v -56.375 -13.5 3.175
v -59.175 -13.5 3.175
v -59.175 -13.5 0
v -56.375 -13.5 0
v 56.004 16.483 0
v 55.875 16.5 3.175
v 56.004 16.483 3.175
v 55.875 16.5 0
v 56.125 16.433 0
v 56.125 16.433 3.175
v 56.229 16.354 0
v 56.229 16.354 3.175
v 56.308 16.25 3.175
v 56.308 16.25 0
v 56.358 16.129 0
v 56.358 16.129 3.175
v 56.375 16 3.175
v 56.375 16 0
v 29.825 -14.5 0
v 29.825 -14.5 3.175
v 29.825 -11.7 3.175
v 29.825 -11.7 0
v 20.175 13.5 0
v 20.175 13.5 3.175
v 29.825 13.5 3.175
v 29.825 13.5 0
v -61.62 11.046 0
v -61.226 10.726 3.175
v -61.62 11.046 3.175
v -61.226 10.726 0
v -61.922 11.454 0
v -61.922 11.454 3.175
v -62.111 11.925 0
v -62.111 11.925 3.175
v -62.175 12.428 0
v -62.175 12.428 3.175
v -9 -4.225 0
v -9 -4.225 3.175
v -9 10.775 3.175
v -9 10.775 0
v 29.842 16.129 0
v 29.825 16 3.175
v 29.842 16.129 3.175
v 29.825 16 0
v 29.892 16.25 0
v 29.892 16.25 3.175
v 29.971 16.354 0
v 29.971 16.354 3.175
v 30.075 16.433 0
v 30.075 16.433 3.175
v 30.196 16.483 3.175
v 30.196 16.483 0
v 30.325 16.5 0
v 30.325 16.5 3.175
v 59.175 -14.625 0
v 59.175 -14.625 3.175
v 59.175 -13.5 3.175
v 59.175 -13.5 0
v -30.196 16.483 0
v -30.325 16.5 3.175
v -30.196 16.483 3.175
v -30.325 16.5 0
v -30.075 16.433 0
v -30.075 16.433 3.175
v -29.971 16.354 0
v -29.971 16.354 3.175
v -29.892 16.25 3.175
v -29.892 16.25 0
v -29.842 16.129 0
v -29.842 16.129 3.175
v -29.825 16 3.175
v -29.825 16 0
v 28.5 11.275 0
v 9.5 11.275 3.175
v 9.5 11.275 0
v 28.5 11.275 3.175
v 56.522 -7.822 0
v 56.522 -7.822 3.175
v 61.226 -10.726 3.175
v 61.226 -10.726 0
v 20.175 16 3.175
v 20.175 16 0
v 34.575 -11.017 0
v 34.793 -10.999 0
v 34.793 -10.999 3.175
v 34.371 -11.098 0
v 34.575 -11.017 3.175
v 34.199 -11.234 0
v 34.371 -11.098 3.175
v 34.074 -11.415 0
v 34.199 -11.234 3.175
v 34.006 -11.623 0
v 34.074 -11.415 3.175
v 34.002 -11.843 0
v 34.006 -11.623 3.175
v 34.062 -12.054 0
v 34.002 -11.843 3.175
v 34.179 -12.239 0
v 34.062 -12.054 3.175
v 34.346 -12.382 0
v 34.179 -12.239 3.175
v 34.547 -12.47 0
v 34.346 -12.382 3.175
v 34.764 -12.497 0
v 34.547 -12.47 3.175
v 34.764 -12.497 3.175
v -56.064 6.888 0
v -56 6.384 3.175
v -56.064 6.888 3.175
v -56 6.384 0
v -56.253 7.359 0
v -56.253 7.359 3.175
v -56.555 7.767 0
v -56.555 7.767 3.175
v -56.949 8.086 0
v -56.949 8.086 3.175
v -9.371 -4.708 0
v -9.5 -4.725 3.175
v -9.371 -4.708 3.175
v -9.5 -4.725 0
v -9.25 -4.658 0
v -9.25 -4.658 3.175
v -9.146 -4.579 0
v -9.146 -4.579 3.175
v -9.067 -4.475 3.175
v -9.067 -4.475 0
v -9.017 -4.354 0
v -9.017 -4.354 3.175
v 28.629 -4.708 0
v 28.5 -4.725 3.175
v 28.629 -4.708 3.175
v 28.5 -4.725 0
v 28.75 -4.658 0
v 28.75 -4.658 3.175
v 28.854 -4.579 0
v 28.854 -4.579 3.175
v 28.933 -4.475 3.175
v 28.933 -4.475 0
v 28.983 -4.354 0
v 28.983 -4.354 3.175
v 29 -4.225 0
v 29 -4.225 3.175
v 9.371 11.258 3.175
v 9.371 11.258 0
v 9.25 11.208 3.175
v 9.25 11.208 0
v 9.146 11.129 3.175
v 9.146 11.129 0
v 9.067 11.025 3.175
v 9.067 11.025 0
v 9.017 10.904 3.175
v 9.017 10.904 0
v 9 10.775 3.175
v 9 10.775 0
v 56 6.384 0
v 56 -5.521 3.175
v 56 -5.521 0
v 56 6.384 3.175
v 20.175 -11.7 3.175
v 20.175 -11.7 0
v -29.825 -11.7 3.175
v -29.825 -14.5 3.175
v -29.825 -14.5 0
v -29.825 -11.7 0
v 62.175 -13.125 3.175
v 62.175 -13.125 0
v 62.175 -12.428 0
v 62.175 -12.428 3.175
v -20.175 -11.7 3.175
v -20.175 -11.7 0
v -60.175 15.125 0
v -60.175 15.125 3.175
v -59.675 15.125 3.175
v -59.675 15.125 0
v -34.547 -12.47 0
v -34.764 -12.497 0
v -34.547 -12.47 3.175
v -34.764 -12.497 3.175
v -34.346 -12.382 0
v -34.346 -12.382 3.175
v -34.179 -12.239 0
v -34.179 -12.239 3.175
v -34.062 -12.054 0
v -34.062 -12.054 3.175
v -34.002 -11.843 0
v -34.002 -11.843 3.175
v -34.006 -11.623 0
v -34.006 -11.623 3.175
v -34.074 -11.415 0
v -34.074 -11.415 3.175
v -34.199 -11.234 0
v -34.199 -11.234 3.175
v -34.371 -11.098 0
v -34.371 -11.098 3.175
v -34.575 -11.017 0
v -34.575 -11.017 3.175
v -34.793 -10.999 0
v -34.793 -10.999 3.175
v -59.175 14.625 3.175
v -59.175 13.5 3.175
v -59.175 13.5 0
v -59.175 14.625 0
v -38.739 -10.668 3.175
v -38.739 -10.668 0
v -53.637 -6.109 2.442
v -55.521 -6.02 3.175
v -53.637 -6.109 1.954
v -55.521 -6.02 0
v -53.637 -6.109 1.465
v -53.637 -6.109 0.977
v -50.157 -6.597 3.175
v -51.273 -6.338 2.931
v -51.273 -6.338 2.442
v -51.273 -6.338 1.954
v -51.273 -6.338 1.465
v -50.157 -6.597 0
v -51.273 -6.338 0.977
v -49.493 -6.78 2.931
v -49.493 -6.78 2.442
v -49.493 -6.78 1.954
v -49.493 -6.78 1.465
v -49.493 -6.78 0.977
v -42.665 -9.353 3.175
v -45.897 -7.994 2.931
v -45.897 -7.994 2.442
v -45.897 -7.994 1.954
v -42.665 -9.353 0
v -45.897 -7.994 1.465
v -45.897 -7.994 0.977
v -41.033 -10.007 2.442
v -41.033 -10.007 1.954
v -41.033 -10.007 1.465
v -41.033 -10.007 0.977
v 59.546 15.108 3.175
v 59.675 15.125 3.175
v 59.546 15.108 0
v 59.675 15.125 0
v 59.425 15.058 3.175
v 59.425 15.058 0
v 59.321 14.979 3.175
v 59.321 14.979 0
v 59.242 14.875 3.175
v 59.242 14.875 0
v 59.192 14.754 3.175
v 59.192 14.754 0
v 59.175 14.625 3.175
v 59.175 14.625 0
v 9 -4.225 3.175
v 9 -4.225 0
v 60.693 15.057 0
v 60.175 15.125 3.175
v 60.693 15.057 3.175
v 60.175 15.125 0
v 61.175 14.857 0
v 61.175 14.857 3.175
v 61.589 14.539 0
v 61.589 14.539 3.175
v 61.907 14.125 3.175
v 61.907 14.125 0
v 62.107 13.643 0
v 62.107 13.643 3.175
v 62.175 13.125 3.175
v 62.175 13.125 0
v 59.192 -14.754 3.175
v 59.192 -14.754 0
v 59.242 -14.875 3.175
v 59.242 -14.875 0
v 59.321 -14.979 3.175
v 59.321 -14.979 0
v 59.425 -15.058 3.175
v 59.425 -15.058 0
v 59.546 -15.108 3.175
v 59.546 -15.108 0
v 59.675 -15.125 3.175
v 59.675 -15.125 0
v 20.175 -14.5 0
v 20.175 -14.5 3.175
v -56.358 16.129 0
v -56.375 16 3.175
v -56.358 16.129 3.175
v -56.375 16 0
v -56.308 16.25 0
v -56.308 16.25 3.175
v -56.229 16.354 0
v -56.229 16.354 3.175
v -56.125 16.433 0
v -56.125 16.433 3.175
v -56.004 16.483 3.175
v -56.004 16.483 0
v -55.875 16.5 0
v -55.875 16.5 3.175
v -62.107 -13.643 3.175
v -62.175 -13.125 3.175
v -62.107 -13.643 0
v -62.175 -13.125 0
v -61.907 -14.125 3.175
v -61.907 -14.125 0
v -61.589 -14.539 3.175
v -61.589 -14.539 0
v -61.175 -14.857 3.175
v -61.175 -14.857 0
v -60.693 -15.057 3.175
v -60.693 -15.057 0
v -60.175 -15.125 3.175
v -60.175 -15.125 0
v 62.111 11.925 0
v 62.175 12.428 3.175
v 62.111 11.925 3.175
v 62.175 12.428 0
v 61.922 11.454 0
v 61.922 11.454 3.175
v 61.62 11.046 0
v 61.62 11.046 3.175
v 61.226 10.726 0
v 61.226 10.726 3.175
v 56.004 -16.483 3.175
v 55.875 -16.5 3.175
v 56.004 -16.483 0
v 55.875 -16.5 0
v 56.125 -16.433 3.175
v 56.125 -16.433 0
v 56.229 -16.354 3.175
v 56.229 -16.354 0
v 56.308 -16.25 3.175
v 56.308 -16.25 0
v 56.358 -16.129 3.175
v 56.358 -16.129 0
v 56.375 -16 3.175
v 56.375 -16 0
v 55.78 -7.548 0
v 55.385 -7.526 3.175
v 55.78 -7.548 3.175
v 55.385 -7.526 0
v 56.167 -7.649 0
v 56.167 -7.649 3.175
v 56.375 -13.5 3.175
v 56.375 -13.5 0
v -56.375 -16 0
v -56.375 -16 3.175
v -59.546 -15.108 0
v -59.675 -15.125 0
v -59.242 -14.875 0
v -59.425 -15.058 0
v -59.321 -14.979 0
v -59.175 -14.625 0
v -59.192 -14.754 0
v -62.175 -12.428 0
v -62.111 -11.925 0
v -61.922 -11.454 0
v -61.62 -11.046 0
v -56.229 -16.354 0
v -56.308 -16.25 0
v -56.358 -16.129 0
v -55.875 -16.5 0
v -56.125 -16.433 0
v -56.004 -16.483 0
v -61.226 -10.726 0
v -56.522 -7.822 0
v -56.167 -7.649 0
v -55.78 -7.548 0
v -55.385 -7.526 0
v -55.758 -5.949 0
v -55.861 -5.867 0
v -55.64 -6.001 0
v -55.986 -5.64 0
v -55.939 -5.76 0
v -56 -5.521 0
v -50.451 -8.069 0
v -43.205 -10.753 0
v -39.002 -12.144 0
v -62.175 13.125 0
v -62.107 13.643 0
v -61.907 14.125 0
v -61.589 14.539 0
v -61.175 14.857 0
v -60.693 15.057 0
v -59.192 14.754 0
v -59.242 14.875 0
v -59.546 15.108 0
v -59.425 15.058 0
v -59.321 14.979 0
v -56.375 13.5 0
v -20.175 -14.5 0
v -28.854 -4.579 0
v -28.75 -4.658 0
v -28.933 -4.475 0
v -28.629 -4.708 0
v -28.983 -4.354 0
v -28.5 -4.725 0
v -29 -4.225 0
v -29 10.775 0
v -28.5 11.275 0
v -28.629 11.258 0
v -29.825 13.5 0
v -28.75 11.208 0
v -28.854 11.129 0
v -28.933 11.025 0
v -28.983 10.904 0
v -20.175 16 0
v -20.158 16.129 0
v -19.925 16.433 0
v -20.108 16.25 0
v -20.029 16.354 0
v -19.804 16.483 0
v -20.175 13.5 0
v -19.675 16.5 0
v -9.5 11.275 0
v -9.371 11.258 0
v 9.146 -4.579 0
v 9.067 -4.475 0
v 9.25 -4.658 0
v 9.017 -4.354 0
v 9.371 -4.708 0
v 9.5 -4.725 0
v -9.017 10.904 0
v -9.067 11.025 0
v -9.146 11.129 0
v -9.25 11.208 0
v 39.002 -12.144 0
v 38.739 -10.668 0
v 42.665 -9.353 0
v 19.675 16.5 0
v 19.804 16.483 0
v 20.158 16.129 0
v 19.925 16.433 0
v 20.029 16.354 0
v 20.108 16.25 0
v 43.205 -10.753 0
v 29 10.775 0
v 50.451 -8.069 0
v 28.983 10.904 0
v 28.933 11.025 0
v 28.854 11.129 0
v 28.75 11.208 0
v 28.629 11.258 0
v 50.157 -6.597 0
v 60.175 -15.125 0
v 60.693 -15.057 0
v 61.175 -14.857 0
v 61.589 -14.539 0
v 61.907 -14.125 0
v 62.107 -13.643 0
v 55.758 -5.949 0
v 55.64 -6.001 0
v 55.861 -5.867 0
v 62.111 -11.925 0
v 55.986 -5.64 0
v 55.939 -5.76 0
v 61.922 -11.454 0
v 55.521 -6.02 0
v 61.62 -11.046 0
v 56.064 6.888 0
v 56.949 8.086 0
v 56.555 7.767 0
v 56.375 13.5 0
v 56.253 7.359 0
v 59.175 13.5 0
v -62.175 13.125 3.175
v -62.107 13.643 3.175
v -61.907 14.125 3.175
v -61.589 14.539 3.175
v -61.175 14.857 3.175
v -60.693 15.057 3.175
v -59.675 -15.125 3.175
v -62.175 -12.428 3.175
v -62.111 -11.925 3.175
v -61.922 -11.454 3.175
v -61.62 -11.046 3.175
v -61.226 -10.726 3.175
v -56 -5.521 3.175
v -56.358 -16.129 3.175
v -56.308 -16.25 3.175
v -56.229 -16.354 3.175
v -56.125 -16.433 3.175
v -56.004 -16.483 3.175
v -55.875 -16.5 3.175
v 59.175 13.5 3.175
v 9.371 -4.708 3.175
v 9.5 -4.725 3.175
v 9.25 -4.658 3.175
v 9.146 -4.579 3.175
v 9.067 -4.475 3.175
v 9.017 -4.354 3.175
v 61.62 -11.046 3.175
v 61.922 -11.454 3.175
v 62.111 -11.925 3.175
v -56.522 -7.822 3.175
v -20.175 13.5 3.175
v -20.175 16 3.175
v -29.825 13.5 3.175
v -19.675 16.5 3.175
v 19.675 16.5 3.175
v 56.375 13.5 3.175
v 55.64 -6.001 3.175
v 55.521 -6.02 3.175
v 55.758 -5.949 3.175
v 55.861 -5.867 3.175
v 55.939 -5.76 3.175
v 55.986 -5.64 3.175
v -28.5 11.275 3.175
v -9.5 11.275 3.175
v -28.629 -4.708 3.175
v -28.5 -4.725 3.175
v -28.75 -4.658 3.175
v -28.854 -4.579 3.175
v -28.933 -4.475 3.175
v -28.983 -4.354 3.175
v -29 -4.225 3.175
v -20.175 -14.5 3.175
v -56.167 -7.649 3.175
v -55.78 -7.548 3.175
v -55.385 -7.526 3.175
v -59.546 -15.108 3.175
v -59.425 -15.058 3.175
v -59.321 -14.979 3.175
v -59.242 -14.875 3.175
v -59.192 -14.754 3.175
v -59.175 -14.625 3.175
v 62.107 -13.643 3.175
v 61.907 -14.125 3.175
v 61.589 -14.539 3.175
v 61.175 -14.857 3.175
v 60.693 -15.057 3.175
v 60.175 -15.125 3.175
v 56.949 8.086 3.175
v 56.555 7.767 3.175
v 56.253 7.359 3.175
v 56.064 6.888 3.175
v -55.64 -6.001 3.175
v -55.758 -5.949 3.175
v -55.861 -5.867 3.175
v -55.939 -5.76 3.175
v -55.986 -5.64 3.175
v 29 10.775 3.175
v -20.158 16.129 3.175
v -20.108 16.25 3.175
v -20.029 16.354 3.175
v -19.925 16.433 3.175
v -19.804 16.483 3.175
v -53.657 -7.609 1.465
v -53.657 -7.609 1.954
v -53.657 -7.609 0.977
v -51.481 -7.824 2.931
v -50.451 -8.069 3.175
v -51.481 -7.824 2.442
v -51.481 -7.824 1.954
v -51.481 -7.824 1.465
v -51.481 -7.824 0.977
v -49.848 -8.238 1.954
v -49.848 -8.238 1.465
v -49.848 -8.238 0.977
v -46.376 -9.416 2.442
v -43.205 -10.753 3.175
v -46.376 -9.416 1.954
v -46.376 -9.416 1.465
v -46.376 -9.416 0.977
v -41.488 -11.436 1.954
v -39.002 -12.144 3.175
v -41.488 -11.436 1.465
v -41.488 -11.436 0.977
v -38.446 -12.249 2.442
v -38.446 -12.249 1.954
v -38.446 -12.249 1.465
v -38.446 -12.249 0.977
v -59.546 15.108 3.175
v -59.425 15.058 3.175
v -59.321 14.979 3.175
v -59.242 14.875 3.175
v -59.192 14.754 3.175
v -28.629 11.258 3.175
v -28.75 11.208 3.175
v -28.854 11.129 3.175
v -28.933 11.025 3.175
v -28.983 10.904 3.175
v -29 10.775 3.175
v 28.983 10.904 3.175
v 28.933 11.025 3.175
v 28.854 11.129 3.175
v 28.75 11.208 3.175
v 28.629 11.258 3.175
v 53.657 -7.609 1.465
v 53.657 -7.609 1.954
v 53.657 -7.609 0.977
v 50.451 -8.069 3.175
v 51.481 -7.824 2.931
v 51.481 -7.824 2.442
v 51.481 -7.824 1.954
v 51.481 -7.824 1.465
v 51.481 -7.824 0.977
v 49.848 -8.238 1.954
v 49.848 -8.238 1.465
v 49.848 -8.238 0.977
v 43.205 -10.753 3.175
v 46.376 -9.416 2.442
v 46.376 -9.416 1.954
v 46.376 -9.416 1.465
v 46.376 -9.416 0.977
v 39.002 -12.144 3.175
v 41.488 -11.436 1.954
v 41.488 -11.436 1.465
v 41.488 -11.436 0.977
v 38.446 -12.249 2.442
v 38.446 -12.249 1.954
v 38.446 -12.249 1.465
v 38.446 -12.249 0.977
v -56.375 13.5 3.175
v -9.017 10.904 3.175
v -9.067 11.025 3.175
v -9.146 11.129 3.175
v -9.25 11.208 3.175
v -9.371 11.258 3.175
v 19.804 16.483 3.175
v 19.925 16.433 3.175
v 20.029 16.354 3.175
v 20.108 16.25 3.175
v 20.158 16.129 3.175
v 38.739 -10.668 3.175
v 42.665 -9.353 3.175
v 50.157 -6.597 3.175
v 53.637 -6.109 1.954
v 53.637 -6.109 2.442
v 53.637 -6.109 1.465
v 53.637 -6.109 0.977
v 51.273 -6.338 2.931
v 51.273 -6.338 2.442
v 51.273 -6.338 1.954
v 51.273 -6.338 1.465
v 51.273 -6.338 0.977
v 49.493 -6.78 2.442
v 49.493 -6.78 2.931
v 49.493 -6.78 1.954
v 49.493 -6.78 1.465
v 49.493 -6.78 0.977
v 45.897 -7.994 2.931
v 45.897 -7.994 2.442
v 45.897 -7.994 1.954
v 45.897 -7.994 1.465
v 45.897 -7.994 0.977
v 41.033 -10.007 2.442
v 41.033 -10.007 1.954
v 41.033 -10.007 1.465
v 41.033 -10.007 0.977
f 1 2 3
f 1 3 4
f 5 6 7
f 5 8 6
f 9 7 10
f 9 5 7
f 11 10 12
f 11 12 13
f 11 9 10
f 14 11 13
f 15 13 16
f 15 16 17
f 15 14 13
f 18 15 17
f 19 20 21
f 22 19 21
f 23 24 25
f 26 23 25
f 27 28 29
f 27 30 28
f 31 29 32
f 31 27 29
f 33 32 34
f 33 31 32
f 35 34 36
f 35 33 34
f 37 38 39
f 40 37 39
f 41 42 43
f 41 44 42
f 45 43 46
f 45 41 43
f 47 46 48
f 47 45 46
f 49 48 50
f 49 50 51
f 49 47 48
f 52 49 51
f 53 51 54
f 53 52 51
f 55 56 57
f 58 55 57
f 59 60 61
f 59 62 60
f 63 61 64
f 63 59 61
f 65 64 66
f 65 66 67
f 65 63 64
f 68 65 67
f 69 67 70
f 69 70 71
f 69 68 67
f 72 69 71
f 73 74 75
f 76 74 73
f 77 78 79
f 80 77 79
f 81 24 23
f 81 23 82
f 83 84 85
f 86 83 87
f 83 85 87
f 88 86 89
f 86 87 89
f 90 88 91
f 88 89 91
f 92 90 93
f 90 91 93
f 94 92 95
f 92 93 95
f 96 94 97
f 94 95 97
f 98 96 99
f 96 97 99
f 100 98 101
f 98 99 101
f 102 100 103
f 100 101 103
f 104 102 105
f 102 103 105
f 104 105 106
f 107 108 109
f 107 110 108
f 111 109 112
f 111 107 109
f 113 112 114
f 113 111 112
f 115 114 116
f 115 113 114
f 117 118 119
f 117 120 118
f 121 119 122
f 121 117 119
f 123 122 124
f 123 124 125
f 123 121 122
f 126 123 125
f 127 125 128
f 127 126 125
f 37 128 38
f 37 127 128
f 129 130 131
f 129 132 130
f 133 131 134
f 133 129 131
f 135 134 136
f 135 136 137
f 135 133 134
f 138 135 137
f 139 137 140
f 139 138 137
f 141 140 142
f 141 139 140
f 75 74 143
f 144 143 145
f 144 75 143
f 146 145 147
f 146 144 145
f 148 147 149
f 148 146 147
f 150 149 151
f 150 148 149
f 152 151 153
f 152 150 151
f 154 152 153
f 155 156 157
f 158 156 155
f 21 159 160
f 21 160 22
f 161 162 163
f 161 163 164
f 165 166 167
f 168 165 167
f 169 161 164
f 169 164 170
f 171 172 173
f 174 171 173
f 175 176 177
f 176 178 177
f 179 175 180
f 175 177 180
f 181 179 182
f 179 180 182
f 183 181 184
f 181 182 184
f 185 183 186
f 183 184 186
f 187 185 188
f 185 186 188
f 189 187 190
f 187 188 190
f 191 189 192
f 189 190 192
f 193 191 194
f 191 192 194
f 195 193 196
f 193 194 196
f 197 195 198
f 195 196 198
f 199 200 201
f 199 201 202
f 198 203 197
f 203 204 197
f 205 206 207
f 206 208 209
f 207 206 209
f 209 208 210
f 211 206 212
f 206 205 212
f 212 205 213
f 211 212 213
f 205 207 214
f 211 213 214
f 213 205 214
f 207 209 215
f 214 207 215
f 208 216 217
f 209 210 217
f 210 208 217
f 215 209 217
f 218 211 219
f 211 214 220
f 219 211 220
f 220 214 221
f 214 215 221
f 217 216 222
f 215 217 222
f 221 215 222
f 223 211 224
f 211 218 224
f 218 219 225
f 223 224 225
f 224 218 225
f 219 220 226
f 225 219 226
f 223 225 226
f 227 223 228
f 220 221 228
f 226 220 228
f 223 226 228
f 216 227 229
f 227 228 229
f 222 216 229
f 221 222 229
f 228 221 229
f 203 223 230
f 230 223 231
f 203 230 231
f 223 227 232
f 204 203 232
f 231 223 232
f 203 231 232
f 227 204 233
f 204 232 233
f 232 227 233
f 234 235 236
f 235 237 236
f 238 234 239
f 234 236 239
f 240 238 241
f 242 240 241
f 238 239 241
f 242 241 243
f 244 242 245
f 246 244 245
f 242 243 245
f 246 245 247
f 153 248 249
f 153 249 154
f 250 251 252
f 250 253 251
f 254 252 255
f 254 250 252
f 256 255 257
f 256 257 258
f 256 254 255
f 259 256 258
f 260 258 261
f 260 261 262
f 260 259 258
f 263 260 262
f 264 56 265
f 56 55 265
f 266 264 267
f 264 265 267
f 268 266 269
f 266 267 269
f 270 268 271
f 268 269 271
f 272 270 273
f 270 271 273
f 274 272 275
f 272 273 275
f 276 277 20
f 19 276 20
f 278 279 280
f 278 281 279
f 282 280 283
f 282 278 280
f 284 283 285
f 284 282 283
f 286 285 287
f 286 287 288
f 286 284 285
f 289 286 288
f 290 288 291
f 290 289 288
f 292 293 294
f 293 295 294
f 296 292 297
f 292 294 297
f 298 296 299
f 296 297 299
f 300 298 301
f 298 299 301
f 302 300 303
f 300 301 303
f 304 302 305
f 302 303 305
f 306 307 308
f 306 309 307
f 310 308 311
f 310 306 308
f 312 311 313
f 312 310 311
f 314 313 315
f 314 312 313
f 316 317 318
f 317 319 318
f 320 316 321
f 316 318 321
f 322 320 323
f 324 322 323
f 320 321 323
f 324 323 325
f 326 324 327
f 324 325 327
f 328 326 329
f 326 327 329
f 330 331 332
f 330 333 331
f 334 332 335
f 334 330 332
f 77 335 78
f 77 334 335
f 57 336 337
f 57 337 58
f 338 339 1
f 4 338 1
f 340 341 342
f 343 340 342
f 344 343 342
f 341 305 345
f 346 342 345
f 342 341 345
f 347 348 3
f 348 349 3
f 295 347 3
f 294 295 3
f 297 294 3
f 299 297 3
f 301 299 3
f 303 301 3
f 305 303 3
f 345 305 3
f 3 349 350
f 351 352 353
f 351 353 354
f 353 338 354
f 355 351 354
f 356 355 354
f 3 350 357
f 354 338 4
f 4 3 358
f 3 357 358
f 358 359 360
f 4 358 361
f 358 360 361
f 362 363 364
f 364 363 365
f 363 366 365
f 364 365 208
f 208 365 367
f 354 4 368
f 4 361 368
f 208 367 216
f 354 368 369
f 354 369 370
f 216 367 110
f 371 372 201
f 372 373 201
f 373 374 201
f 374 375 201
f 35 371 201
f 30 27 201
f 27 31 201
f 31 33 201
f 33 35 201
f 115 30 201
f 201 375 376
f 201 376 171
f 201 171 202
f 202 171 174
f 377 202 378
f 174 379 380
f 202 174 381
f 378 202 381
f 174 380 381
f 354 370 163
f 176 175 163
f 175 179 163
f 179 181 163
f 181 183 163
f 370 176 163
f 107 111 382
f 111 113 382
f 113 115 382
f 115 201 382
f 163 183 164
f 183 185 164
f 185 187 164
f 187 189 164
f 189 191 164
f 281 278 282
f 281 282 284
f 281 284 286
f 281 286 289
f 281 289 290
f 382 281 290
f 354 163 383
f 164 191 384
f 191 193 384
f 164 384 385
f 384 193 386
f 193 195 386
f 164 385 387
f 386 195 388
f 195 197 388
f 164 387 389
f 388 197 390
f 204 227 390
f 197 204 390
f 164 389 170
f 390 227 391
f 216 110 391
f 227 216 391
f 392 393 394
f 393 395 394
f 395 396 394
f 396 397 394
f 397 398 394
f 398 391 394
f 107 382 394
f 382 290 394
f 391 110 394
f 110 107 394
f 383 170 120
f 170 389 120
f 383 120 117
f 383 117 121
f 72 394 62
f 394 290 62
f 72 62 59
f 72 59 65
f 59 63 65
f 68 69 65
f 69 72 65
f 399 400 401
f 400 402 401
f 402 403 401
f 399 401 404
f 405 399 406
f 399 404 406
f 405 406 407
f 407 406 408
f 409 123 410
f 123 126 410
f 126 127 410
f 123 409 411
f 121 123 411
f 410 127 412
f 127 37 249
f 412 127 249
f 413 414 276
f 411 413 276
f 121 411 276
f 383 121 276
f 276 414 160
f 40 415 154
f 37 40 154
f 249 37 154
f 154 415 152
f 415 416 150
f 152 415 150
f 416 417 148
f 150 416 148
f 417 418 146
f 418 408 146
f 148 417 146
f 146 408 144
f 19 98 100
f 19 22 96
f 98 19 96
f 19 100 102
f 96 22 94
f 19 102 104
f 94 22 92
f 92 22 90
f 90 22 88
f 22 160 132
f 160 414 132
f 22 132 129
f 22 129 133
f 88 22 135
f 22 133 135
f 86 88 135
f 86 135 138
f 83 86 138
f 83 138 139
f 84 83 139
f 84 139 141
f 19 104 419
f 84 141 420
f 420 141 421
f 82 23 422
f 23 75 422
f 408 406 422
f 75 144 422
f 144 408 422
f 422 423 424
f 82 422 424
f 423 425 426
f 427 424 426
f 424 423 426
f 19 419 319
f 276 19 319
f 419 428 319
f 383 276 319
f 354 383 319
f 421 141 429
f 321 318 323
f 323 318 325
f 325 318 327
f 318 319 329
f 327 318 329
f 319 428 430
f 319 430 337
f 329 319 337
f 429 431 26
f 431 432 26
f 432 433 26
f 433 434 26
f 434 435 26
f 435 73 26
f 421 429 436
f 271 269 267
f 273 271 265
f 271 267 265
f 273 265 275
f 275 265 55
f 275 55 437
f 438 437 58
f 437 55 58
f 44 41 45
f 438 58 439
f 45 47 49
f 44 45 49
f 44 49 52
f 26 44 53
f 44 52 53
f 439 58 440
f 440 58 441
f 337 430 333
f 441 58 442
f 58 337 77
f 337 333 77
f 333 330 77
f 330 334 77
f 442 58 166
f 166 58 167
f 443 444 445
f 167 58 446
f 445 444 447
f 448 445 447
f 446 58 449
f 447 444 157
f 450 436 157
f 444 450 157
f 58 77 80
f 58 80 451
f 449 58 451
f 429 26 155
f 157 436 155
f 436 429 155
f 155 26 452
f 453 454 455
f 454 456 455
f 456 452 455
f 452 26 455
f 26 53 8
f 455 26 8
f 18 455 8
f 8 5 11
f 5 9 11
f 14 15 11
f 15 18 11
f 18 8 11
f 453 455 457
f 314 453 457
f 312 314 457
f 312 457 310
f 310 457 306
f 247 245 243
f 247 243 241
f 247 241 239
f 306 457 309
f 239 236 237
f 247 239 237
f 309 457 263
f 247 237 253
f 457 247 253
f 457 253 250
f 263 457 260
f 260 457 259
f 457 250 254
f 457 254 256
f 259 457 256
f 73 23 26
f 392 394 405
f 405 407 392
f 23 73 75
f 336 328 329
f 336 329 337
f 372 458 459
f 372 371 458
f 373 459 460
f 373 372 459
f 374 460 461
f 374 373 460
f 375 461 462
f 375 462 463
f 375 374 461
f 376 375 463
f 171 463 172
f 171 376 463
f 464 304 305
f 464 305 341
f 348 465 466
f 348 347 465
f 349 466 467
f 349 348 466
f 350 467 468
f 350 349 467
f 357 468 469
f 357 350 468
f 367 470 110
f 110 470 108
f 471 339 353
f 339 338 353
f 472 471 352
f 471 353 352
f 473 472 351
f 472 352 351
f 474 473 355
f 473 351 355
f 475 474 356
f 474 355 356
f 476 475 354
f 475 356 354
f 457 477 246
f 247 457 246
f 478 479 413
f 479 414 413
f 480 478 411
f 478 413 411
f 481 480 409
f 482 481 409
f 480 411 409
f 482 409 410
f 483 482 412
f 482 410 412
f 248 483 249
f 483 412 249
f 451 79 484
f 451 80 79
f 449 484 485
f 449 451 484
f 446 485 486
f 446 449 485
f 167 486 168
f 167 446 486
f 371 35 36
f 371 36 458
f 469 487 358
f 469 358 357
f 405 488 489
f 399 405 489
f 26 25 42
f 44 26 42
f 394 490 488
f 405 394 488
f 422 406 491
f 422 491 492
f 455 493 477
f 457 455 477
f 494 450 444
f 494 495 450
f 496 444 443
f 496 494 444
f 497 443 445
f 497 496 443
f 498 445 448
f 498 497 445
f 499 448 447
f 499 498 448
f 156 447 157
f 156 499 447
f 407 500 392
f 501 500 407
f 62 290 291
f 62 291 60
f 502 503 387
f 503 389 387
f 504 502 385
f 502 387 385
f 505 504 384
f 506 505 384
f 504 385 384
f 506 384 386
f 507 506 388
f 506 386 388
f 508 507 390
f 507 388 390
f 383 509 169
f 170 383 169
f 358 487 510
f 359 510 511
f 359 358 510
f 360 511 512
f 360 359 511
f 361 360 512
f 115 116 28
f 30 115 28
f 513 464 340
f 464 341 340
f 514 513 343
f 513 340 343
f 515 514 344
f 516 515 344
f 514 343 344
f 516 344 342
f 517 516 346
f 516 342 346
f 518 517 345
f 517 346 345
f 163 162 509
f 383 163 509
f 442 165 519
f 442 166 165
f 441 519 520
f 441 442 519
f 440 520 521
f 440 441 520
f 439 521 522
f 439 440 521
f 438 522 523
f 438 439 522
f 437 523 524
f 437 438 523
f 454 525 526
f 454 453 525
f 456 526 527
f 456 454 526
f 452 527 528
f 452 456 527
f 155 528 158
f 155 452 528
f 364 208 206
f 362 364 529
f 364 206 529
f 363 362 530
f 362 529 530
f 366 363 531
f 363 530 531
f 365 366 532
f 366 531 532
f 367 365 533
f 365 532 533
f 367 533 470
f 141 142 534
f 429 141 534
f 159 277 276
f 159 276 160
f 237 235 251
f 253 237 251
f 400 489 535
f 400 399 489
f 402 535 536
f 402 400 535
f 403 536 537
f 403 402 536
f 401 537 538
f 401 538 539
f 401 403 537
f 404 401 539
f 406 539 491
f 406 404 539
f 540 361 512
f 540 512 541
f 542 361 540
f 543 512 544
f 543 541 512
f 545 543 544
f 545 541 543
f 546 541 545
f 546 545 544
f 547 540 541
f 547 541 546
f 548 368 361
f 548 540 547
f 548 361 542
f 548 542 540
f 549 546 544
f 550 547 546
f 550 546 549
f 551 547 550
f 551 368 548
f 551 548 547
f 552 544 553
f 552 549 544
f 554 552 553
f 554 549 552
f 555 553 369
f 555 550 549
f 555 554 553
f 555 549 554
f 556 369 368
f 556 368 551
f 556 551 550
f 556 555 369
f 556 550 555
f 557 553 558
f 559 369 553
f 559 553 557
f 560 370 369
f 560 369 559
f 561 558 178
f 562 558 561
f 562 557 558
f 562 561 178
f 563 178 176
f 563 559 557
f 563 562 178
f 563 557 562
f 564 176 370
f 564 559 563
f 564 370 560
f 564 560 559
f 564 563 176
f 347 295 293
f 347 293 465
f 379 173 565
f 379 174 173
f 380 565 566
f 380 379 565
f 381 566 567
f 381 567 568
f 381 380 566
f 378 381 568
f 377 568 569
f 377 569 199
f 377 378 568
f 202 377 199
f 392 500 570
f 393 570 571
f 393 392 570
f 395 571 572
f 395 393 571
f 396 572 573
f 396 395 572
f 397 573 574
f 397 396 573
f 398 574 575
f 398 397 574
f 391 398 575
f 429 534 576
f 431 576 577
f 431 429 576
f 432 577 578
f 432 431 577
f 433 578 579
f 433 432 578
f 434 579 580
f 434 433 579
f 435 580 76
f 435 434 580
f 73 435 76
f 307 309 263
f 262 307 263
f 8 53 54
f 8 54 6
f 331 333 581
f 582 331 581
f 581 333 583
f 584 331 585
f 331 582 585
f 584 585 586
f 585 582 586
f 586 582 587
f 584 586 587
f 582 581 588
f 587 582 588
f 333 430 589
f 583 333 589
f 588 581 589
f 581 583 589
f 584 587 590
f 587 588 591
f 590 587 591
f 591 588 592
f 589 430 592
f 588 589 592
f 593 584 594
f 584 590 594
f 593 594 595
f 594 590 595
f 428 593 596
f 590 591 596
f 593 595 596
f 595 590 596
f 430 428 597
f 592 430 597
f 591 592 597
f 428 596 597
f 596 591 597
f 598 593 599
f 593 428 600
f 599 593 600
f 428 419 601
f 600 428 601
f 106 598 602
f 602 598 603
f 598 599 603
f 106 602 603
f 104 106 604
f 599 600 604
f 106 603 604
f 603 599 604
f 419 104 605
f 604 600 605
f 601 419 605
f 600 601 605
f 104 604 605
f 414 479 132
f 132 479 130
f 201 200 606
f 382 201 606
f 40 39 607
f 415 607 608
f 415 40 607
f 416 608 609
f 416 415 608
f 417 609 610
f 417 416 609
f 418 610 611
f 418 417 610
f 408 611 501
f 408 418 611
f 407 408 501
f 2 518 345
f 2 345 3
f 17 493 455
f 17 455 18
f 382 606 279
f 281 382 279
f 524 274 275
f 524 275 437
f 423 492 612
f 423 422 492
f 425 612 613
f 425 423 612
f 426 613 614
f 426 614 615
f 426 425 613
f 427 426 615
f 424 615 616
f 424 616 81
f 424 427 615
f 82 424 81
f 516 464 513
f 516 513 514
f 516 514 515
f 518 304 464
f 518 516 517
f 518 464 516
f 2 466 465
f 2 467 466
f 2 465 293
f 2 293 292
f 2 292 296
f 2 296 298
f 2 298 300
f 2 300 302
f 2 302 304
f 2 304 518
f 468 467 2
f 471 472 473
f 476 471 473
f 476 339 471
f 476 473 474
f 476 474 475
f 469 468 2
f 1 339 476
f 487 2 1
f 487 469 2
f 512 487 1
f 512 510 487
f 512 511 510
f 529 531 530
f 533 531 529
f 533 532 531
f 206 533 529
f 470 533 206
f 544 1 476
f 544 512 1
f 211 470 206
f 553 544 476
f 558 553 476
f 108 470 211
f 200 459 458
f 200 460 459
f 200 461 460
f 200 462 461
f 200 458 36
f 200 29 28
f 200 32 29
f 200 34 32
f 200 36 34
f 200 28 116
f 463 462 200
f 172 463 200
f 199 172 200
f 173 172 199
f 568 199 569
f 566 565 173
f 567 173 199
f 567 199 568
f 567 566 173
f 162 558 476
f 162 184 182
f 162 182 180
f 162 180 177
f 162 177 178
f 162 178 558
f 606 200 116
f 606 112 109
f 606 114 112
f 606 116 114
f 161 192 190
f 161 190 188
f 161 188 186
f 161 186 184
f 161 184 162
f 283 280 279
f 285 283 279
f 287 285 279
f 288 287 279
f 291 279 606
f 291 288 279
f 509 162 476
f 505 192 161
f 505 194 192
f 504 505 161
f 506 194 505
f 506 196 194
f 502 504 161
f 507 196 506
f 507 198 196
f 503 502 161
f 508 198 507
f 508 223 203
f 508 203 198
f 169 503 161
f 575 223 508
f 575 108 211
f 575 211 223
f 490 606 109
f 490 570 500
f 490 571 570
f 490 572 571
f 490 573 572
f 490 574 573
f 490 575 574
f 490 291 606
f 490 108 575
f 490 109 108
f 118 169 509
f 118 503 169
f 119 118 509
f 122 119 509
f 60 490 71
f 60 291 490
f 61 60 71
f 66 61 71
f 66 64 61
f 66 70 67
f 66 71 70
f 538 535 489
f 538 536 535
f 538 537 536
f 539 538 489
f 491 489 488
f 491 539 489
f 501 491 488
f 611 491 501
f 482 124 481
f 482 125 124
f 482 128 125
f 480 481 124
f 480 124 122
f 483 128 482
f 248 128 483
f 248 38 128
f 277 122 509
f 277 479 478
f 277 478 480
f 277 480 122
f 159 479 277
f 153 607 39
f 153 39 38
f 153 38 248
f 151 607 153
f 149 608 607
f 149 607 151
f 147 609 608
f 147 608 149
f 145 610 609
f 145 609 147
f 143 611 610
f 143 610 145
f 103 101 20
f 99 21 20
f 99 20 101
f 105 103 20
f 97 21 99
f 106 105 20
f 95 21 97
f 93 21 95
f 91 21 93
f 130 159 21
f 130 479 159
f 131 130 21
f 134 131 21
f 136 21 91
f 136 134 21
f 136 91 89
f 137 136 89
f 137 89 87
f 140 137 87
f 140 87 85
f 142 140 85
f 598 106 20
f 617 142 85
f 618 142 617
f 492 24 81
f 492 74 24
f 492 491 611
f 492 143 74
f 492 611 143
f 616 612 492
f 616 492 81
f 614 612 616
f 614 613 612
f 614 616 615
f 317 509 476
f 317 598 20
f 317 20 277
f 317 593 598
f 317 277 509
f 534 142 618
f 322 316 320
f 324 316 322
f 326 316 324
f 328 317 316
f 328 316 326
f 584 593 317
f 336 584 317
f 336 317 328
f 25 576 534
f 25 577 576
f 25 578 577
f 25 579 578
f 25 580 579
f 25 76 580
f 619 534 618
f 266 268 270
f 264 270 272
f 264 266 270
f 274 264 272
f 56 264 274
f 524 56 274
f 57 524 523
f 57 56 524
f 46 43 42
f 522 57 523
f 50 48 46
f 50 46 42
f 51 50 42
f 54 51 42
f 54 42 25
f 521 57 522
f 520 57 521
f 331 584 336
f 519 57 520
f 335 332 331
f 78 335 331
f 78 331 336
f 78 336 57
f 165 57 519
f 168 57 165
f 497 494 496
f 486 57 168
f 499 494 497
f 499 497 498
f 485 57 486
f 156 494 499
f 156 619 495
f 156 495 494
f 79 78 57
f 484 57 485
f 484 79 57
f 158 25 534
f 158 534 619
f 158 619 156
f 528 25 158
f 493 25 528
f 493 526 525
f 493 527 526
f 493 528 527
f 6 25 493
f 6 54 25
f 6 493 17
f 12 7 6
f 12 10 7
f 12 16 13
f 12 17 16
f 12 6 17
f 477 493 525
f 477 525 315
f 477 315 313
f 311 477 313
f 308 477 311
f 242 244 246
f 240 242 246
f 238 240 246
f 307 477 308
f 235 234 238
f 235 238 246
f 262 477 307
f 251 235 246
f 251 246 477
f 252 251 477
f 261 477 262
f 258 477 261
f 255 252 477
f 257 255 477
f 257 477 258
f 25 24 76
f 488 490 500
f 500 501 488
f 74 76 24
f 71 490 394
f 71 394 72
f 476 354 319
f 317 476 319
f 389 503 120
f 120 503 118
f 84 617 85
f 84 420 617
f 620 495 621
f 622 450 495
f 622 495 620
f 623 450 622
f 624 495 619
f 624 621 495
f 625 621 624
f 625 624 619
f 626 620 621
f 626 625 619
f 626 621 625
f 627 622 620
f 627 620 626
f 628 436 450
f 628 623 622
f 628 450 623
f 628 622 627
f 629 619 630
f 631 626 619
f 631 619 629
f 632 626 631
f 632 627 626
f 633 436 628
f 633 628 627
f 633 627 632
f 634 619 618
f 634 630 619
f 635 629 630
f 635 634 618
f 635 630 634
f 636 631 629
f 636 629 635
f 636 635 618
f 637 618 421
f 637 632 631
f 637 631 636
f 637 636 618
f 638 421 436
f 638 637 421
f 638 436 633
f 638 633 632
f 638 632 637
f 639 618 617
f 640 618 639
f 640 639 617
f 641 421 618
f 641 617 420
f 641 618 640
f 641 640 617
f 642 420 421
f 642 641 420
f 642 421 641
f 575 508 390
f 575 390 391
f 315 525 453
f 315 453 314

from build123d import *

# Parameters (mm, degrees)
SKETCH1_W           = 124.35
SKETCH1_H           = 33
BOSS_EXTRUDE1_DEPTH = 3.175
SKETCH2_W           = 9.65
SKETCH2_H           = 2.8
SKETCH2_H_2         = 3
CUT_EXTRUDE1_DEPTH  = 65.405444257
SKETCH4_W           = 2.8
SKETCH4_H           = 3
SKETCH4_W_2         = 6.175
SKETCH4_H_2         = 15
CUT_EXTRUDE2_DEPTH  = 65.405444257
SKETCH6_W           = 3
SKETCH6_H           = 1.375
CUT_EXTRUDE3_DEPTH  = 65.405444257
CUT_SWEEP1_DEPTH    = 3.175
SKETCH12_R          = 0.75
CUT_EXTRUDE6_DEPTH  = 65.405444385
CUT_EXTRUDE7_DEPTH  = 65.405444385
FILLET6_R           = 2
FILLET7_R           = 0.5
SKETCH15_W          = 20
SKETCH15_H          = 16
CUT_EXTRUDE9_DEPTH  = 65.405444385
FILLET9_R           = 0.5


# Read off the part's stored shape, not the designer's step: Cut-Sweep1
with BuildPart() as part:
    # Sketch1 → Boss-Extrude1 (new body)
    with BuildSketch(Plane.XY):
        Rectangle(SKETCH1_W, SKETCH1_H)
    extrude(amount=BOSS_EXTRUDE1_DEPTH)

    # Sketch2 → Cut-Extrude1 (cut, through all)
    with BuildSketch(Plane.XY.offset(3.175)):
        with Locations((-25, -13.1)):
            Rectangle(SKETCH2_W, SKETCH2_H)
        with Locations((25, -13.1)):
            Rectangle(SKETCH2_W, SKETCH2_H)
        with Locations((-25, 15)):
            Rectangle(SKETCH2_W, SKETCH2_H_2)
        with Locations((25, 15)):
            Rectangle(SKETCH2_W, SKETCH2_H_2)
    extrude(amount=-CUT_EXTRUDE1_DEPTH, mode=Mode.SUBTRACT)

    # Sketch4 → Cut-Extrude2 (cut, through all)
    with BuildSketch(Plane.XY.offset(3.175)):
        with Locations((-57.775, 15)):
            Rectangle(SKETCH4_W, SKETCH4_H)
        with Locations((-59.0875, 0)):
            Rectangle(SKETCH4_W_2, SKETCH4_H_2)
        with Locations((-57.775, -15)):
            Rectangle(SKETCH4_W, SKETCH4_H)
        with Locations((57.775, 15)):
            Rectangle(SKETCH4_W, SKETCH4_H)
        with Locations((59.0875, 0)):
            Rectangle(SKETCH4_W_2, SKETCH4_H_2)
        with Locations((57.775, -15)):
            Rectangle(SKETCH4_W, SKETCH4_H)
    extrude(amount=-CUT_EXTRUDE2_DEPTH, mode=Mode.SUBTRACT)

    # Sketch6 → Cut-Extrude3 (cut, through all)
    with BuildSketch(Plane.XY.offset(3.175)):
        with Locations((-60.675, 15.8125)):
            Rectangle(SKETCH6_W, SKETCH6_H)
        with Locations((-60.675, -15.8125)):
            Rectangle(SKETCH6_W, SKETCH6_H)
        with Locations((60.675, 15.8125)):
            Rectangle(SKETCH6_W, SKETCH6_H)
        with Locations((60.675, -15.8125)):
            Rectangle(SKETCH6_W, SKETCH6_H)
    extrude(amount=-CUT_EXTRUDE3_DEPTH, mode=Mode.SUBTRACT)

    # Cut-Sweep1 outline → Cut-Sweep1 (cut)
    with BuildSketch(Plane.XY):
        with BuildLine():
            add(Edge.make_bspline(
                [(-56, -6), (-55.016272395, -6.040912607), (-53.484317245, -6.110006936), (-52.10462272, -6.208217255), (-51.370216858, -6.312882143), (-50.849013323, -6.424427059), (-50.274077583, -6.562740427), (-49.507561658, -6.770408498), (-47.98416767, -7.234467607), (-46.535590196, -7.742954919), (-44.899823838, -8.383891144), (-43.265010906, -9.091671777), (-41.074137026, -10.055384808), (-38.357692762, -10.850187014), (-36.1078612, -11.027108547), (-34.793437631, -10.999002823)],
                knots=[0, 0, 0, 0, 0.052266667, 0.104533333, 0.1568, 0.188540911, 0.209066667, 0.261333333, 0.3136, 0.4368, 0.46346514, 0.56, 0.706666667, 0.853333333, 1, 1, 1, 1], degree=3))
            Line((-56, -6), (-56, -7.5))
            add(Edge.make_bspline(
                [(-56, -7.5), (-55.020423649, -7.540842864), (-53.496771007, -7.609797709), (-52.171479553, -7.70829789), (-51.569513747, -7.80075633), (-51.115986388, -7.900930823), (-50.592043829, -8.028791809), (-49.863497697, -8.22781936), (-48.398796638, -8.676488924), (-46.992197023, -9.172450468), (-45.412650318, -9.7933523), (-43.831176536, -10.480660701), (-41.561928867, -11.478467634), (-38.556226285, -12.350501385), (-36.110914304, -12.525218982), (-34.698750526, -12.49601129)],
                knots=[0, 0, 0, 0, 0.052266667, 0.104533333, 0.1568, 0.188540911, 0.209066667, 0.261333333, 0.3136, 0.4368, 0.46346514, 0.56, 0.706666667, 0.853333333, 1, 1, 1, 1], degree=3))
            Line((-34.698750526, -12.49601129), (-34.793437631, -10.999002823))
        make_face()
    cut_sweep1 = extrude(amount=CUT_SWEEP1_DEPTH, mode=Mode.SUBTRACT)

    # Mirror1: Cut-Sweep1 across plane
    add(cut_sweep1.mirror(Plane.ZY), mode=Mode.SUBTRACT)

    # Sketch12 → Cut-Extrude6 (cut, through all)
    with BuildSketch(Plane.XY.offset(3.175)):
        with Locations((-34.746094079, -11.747507056)):
            Circle(SKETCH12_R)
        with Locations((34.746094079, -11.747507056)):
            Circle(SKETCH12_R)
    extrude(amount=-CUT_EXTRUDE6_DEPTH, mode=Mode.SUBTRACT)

    # Sketch13 → Cut-Extrude7 (cut, through all)
    with BuildSketch(Plane.XY.offset(3.175)):
        Polygon((-56, 7.5), (-62.175, 11.3125), (-62.175, 7.5), align=None)
        Polygon((-56, -7.5), (-62.175, -11.3125), (-62.175, -7.5), align=None)
        Polygon((56, 7.5), (62.175, 11.3125), (62.175, 7.5), align=None)
        Polygon((56, -7.5), (62.175, -11.3125), (62.175, -7.5), align=None)
    extrude(amount=-CUT_EXTRUDE7_DEPTH, mode=Mode.SUBTRACT)

    # Fillet6
    fillet6_edges = [part.edges().sort_by_distance(p)[0] for p in [
        (62.175, -15.125, 1.5875),
        (62.175, -11.3125, 1.5875),
        (56, -7.5, 1.5875),
        (56, 7.5, 1.5875),
        (62.175, 11.3125, 1.5875),
        (62.175, 15.125, 1.5875),
        (-62.175, -15.125, 1.5875),
        (-62.175, -11.3125, 1.5875),
        (-56, -7.5, 1.5875),
        (-62.175, 15.125, 1.5875),
        (-62.175, 11.3125, 1.5875),
        (-56, 7.5, 1.5875),
    ]]
    fillet(fillet6_edges, radius=FILLET6_R)

    # Fillet7
    fillet7_edges = [part.edges().sort_by_distance(p)[0] for p in [
        (59.175, 15.125, 1.5875),
        (59.175, -15.125, 1.5875),
        (-59.175, -15.125, 1.5875),
        (-59.175, 15.125, 1.5875),
        (20.175, 16.5, 1.5875),
        (29.825, 16.5, 1.5875),
        (-20.175, 16.5, 1.5875),
        (-29.825, 16.5, 1.5875),
        (56.375, -16.5, 1.5875),
        (56, -6, 1.5875),
        (56.375, 16.5, 1.5875),
        (-56.375, 16.5, 1.5875),
        (-56.375, -16.5, 1.5875),
        (-56, -6, 1.5875),
    ]]
    fillet(fillet7_edges, radius=FILLET7_R)

    # Sketch15 → Cut-Extrude9 (cut, through all)
    with BuildSketch(Plane.XY.offset(3.175)):
        with Locations((-19, 3.275)):
            Rectangle(SKETCH15_W, SKETCH15_H)
        with Locations((19, 3.275)):
            Rectangle(SKETCH15_W, SKETCH15_H)
    extrude(amount=-CUT_EXTRUDE9_DEPTH, mode=Mode.SUBTRACT)

    # Fillet9
    fillet9_edges = [part.edges().sort_by_distance(p)[0] for p in [
        (-29, -4.725, 1.5875),
        (-29, 11.275, 1.5875),
        (-9, 11.275, 1.5875),
        (-9, -4.725, 1.5875),
        (9, -4.725, 1.5875),
        (9, 11.275, 1.5875),
        (29, 11.275, 1.5875),
        (29, -4.725, 1.5875),
    ]]
    fillet(fillet9_edges, radius=FILLET9_R)


solid = part.part
